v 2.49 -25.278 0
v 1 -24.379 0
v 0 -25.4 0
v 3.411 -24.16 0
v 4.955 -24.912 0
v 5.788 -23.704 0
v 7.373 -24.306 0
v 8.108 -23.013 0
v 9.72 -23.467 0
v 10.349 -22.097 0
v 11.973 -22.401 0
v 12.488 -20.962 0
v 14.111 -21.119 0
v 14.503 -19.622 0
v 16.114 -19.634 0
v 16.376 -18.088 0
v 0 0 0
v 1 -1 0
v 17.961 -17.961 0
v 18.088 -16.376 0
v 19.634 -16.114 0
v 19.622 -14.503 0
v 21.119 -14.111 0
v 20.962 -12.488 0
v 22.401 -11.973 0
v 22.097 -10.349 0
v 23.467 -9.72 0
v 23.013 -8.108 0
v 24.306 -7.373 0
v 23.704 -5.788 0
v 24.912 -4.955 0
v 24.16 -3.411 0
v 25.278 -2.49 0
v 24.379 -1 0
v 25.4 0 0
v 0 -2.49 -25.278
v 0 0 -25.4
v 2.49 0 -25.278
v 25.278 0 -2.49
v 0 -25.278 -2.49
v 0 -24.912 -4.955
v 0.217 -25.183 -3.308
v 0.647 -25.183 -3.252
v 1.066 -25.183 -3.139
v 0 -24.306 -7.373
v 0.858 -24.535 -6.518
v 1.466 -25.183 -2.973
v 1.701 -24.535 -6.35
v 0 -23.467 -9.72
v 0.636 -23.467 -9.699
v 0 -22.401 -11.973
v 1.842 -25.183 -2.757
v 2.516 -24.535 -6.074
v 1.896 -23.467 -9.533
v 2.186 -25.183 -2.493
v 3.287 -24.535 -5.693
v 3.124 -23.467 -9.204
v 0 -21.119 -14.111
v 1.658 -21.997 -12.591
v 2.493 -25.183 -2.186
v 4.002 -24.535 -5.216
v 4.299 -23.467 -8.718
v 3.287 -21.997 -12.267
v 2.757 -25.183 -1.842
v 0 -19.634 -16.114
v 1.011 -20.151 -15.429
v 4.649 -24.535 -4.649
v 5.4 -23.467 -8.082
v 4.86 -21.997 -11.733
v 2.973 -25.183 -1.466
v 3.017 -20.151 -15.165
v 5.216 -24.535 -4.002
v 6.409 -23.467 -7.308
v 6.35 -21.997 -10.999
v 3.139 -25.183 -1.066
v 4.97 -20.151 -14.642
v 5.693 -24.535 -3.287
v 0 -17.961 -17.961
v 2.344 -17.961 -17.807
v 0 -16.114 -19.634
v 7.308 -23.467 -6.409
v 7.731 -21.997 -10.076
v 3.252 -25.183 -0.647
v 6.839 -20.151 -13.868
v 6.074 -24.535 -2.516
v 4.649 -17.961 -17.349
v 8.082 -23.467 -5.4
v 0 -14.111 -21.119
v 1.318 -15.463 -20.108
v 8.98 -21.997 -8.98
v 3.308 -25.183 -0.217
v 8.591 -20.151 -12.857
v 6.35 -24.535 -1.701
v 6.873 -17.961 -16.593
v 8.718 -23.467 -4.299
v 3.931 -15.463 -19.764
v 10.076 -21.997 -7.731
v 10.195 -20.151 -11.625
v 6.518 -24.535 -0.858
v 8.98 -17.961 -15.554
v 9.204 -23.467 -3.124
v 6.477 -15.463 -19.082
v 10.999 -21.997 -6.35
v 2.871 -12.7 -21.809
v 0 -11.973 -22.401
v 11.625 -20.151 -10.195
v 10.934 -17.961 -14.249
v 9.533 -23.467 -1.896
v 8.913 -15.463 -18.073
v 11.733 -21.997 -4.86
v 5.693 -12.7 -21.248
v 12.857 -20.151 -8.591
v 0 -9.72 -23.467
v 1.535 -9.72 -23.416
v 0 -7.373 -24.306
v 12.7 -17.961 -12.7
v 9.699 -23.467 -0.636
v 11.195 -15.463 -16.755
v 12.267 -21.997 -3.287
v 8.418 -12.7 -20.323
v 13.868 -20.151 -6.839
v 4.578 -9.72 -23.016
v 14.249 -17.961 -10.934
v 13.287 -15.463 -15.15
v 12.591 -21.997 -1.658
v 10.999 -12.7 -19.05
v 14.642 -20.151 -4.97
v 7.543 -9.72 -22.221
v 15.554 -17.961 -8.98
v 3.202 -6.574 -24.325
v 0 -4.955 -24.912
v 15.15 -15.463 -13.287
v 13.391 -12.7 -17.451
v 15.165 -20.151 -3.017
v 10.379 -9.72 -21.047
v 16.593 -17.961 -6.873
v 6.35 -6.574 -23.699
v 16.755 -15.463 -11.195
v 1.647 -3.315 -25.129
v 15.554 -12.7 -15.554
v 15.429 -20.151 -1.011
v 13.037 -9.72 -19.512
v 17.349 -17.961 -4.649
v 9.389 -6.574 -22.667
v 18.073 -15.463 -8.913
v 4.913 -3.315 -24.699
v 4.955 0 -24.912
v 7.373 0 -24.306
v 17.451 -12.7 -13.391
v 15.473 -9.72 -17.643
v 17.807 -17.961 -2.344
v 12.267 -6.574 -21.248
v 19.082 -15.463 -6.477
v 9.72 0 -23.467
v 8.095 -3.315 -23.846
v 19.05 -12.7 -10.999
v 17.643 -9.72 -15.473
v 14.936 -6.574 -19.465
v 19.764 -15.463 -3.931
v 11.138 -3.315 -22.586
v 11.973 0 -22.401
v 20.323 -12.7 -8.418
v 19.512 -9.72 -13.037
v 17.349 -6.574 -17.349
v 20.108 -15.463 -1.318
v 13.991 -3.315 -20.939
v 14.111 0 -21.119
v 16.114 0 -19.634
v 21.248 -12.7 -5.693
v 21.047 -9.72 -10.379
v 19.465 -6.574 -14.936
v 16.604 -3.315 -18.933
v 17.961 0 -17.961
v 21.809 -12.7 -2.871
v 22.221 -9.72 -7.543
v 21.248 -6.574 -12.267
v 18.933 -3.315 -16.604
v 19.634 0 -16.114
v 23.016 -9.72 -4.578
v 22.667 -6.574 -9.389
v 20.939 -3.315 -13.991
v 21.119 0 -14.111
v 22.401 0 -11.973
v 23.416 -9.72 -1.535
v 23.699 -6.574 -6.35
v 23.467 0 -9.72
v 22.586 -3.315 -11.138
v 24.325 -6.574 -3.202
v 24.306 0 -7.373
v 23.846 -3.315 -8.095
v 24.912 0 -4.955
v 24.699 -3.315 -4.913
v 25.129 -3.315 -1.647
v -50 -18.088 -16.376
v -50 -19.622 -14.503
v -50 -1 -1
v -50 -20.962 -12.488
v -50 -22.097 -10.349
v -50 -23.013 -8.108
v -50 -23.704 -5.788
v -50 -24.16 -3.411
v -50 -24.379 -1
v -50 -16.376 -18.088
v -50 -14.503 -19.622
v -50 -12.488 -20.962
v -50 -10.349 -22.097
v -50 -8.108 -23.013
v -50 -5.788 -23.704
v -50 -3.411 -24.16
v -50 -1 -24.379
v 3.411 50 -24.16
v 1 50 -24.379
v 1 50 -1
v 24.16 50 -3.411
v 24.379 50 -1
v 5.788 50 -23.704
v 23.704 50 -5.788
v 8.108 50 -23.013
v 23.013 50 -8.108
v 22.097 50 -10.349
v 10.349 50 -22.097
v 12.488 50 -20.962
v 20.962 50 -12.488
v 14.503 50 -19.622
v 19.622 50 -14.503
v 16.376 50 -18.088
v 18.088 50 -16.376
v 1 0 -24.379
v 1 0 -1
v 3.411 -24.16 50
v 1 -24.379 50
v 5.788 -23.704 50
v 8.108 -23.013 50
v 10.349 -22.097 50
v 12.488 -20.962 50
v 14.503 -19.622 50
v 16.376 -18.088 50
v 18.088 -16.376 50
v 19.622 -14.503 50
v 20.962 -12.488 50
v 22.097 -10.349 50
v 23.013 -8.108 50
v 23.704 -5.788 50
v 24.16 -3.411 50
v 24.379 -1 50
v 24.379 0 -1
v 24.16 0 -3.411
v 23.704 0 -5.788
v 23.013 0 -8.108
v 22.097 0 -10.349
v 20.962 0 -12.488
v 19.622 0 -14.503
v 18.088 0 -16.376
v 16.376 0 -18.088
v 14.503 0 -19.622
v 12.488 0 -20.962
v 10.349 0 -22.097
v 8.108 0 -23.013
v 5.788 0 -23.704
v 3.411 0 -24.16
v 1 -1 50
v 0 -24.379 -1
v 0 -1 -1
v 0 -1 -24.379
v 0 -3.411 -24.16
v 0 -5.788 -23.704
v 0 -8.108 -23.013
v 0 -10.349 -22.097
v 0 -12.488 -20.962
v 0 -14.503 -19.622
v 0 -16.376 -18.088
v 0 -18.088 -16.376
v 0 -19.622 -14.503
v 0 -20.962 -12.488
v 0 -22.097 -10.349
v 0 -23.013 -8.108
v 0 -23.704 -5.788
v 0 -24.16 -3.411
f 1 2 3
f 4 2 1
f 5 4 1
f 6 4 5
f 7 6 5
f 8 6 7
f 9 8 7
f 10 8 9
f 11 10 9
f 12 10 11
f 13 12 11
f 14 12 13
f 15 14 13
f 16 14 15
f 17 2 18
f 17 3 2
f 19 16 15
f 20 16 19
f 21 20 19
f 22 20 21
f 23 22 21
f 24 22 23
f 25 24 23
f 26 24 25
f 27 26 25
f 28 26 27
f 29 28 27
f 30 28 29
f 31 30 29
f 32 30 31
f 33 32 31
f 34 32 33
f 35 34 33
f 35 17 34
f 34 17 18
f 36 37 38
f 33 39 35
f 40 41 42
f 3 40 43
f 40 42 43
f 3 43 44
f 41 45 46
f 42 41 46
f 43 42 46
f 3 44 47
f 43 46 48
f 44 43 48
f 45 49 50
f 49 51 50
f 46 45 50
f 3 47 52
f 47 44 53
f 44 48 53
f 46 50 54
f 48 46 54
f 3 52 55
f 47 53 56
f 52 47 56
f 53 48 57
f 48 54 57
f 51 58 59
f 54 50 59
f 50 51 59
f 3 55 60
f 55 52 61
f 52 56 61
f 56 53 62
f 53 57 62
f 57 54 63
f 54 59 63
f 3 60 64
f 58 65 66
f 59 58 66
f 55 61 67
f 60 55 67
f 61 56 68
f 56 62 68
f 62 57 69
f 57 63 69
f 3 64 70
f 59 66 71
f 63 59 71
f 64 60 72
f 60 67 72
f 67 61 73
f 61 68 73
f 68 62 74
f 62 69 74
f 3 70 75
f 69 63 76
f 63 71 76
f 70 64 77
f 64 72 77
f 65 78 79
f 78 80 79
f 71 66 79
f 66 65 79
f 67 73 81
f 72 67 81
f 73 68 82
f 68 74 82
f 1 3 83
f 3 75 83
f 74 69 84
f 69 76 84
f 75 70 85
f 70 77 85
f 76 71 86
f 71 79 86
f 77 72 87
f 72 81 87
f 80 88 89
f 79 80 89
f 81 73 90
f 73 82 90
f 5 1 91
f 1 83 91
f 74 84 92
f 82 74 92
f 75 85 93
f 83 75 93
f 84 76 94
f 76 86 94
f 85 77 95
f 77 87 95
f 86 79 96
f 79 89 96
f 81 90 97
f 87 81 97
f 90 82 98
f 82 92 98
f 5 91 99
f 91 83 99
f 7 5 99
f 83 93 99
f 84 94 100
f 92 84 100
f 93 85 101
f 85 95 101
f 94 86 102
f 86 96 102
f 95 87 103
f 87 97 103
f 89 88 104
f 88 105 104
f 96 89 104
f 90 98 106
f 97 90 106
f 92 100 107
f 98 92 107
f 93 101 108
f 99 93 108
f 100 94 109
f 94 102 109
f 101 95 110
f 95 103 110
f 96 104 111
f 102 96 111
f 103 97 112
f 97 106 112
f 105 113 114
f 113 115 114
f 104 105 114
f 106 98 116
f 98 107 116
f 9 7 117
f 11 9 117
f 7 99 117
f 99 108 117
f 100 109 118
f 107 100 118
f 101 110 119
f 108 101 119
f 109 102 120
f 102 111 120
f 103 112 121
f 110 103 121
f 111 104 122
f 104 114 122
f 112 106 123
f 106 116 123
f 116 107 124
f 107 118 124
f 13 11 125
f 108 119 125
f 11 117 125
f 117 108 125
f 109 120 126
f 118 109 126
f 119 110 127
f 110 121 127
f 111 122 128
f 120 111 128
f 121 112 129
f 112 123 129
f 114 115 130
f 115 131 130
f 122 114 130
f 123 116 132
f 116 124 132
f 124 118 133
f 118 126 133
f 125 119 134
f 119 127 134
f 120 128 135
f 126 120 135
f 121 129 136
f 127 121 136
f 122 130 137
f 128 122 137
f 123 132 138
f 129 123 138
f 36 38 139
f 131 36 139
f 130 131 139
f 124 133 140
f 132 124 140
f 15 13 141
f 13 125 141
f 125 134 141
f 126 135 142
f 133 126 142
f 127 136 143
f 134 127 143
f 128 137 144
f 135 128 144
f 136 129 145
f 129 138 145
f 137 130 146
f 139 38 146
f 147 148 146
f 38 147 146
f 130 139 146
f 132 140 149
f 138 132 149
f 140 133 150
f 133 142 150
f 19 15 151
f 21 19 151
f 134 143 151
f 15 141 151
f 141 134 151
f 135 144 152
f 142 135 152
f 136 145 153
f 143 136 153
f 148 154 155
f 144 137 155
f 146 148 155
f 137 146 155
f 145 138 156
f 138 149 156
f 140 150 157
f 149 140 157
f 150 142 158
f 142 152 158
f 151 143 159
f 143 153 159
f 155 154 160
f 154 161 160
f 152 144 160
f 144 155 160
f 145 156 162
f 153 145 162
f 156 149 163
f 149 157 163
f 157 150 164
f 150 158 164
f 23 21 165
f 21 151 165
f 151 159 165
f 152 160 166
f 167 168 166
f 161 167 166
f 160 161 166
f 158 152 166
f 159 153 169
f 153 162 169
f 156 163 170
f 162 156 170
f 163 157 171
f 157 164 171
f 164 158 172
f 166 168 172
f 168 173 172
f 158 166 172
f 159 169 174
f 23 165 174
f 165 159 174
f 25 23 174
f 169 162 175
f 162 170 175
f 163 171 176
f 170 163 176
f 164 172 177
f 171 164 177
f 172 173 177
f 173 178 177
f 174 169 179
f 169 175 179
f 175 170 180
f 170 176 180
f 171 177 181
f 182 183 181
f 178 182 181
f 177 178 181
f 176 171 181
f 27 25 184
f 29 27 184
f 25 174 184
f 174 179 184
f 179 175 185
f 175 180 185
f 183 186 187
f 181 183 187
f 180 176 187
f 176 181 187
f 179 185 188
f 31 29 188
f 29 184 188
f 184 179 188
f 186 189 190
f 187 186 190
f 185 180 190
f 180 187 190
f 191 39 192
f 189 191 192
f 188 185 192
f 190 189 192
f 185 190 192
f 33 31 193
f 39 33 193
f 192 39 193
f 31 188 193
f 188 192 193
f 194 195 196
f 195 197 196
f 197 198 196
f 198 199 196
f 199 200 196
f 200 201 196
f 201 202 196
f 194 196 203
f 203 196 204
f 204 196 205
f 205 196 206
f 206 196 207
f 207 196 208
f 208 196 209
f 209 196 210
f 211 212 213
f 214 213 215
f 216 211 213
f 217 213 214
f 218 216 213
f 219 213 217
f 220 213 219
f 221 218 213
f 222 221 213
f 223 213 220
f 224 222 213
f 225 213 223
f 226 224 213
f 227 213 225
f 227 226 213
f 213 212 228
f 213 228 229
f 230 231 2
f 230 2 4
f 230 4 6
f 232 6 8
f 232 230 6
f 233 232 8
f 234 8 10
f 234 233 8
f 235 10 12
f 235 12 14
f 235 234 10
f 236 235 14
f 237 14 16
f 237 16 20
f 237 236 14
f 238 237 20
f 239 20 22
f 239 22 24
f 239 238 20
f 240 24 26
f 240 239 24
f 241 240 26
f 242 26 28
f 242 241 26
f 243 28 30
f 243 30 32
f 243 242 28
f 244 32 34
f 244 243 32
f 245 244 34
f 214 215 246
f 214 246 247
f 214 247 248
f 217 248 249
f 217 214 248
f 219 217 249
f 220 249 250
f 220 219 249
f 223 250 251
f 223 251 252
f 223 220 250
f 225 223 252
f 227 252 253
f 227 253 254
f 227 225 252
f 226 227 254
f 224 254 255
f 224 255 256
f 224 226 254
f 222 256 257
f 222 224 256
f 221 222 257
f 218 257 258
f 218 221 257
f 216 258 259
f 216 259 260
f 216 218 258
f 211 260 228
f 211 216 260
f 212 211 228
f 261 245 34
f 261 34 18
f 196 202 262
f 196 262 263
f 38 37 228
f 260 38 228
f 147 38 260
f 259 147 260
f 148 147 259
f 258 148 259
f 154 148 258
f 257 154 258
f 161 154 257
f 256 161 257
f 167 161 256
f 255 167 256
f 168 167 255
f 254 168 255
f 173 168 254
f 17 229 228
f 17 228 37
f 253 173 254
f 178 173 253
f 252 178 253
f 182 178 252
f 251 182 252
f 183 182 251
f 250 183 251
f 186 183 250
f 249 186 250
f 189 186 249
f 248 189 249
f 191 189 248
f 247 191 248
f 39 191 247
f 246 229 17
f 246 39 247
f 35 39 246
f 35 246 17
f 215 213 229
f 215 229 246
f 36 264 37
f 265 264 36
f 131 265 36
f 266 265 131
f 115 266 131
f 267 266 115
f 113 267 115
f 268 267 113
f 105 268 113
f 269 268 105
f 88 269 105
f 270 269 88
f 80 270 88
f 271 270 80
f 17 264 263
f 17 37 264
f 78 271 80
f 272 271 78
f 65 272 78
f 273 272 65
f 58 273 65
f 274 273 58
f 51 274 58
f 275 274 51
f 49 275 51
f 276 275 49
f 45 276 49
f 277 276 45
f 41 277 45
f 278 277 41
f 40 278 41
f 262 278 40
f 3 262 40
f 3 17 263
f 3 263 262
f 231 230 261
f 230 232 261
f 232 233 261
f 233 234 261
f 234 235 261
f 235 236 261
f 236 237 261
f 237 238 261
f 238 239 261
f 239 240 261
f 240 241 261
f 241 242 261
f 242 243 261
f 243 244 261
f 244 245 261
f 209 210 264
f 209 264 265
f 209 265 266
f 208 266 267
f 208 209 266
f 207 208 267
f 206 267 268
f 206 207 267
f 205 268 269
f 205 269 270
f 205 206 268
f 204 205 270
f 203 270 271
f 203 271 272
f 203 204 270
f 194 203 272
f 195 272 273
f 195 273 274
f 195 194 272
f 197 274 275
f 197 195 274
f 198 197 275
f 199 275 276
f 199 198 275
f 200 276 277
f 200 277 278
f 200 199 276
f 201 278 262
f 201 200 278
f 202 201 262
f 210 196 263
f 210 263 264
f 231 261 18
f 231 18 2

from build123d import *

# Parameters (mm, degrees)
SALIENTE_EXTRUIR1_DEPTH = 50
SALIENTE_EXTRUIR2_DEPTH = 50
SALIENTE_EXTRUIR3_DEPTH = 50
CORTAR_EXTRUIR1_DEPTH   = 30
CROQUIS8_W              = 25.4
CROQUIS8_H              = 25.4
CORTAR_EXTRUIR5_DEPTH   = 50
CROQUIS9_W              = 25.4
CROQUIS9_H              = 25.4
CORTAR_EXTRUIR6_DEPTH   = 50
CORTAR_EXTRUIR7_DEPTH   = 50
CORTAR_EXTRUIR8_DEPTH   = 50
CORTAR_EXTRUIR9_DEPTH   = 50


with BuildPart() as part:
    # Croquis1 → Revolución1 (revolve)
    with BuildSketch(Plane.XY):
        with BuildLine():
            Line((0, 25.4), (0, -25.4))
            ThreePointArc((0, -25.4), (25.4, 0), (0, 25.4))
        make_face()
    revolve(axis=Axis((0, 32.899125747, 0), (0, -1, 0)))

    # Croquis2 → Saliente-Extruir1 (add)
    with BuildSketch(Plane(origin=(0, 0, 0), x_dir=(1, 0, 0), z_dir=(0, 1, 0))):
        with BuildLine():
            Line((0, 25.4), (0, 0))
            Line((0, 0), (25.4, 0))
            ThreePointArc((25.4, 0), (17.960512242, 17.960512242), (0, 25.4))
        make_face()
    extrude(amount=SALIENTE_EXTRUIR1_DEPTH)

    # Croquis3 → Saliente-Extruir2 (add)
    with BuildSketch(Plane.XY):
        with BuildLine():
            Line((0, 0), (25.4, 0))
            ThreePointArc((25.4, 0), (17.960512242, -17.960512242), (0, -25.4))
            Line((0, -25.4), (0, 0))
        make_face()
    extrude(amount=SALIENTE_EXTRUIR2_DEPTH)

    # Croquis4 → Saliente-Extruir3 (add)
    with BuildSketch(Plane(origin=(0, 0, 0), x_dir=(0, 0, -1), z_dir=(1, 0, 0))):
        with BuildLine():
            Line((25.4, 0), (0, 0))
            Line((0, 0), (0, -25.4))
            ThreePointArc((0, -25.4), (17.960512242, -17.960512242), (25.4, 0))
        make_face()
    extrude(amount=-SALIENTE_EXTRUIR3_DEPTH)

    # Croquis5 → Cortar-Extruir1 (cut, symmetric)
    with BuildSketch(Plane.XY):
        with BuildLine():
            Line((0, 25.4), (0, 0))
            Line((0, 0), (-25.4, 0))
            ThreePointArc((-25.4, 0), (-17.960512242, 17.960512242), (0, 25.4))
        make_face()
    extrude(amount=CORTAR_EXTRUIR1_DEPTH, both=True, mode=Mode.SUBTRACT)

    # Croquis8 → Cortar-Extruir5 (cut)
    with BuildSketch(Plane(origin=(0, 0, 0), x_dir=(0, 0, -1), z_dir=(1, 0, 0))):
        with Locations((-12.7, 12.7)):
            Rectangle(CROQUIS8_W, CROQUIS8_H)
    extrude(amount=CORTAR_EXTRUIR5_DEPTH, mode=Mode.SUBTRACT)

    # Croquis9 → Cortar-Extruir6 (cut)
    with BuildSketch(Plane(origin=(0, 0, 0), x_dir=(1, 0, 0), z_dir=(0, 1, 0))):
        with Locations((-12.7, -12.7)):
            Rectangle(CROQUIS9_W, CROQUIS9_H)
    extrude(amount=-CORTAR_EXTRUIR6_DEPTH, mode=Mode.SUBTRACT)

    # Croquis11 → Cortar-Extruir7 (cut)
    with BuildSketch(Plane.ZY.offset(50)):
        with BuildLine():
            Line((0, -25.4), (0, 0))
            Line((0, 0), (-25.4, 0))
            ThreePointArc((-25.4, 0), (-17.960512242, -17.960512242), (0, -25.4))
        make_face()
        with BuildLine():
            Line((-1, -24.379499585), (-1, -1))
            Line((-1, -1), (-24.379499585, -1))
            ThreePointArc((-24.379499585, -1), (-17.253405461, -17.253405461), (-1, -24.379499585))
        make_face(mode=Mode.SUBTRACT)
    extrude(amount=-CORTAR_EXTRUIR7_DEPTH, mode=Mode.SUBTRACT)

    # Croquis12 → Cortar-Extruir8 (cut)
    with BuildSketch(Plane(origin=(0, 50, 0), x_dir=(1, 0, 0), z_dir=(0, 1, 0))):
        with BuildLine():
            Line((0, 25.4), (0, 0))
            Line((0, 0), (25.4, 0))
            ThreePointArc((25.4, 0), (17.960512242, 17.960512242), (0, 25.4))
        make_face()
        with BuildLine():
            Line((1, 24.379499585), (1, 1))
            Line((1, 1), (24.379499585, 1))
            ThreePointArc((24.379499585, 1), (17.253405461, 17.253405461), (1, 24.379499585))
        make_face(mode=Mode.SUBTRACT)
    extrude(amount=-CORTAR_EXTRUIR8_DEPTH, mode=Mode.SUBTRACT)

    # Croquis13 → Cortar-Extruir9 (cut)
    with BuildSketch(Plane.XY.offset(50)):
        with BuildLine():
            Line((0, 0), (0, -25.4))
            ThreePointArc((0, -25.4), (17.960512242, -17.960512242), (25.4, 0))
            Line((25.4, 0), (0, 0))
        make_face()
        with BuildLine():
            Line((1, -1), (1, -24.379499585))
            ThreePointArc((1, -24.379499585), (17.253405461, -17.253405461), (24.379499585, -1))
            Line((24.379499585, -1), (1, -1))
        make_face(mode=Mode.SUBTRACT)
    extrude(amount=-CORTAR_EXTRUIR9_DEPTH, mode=Mode.SUBTRACT)


solid = part.part
